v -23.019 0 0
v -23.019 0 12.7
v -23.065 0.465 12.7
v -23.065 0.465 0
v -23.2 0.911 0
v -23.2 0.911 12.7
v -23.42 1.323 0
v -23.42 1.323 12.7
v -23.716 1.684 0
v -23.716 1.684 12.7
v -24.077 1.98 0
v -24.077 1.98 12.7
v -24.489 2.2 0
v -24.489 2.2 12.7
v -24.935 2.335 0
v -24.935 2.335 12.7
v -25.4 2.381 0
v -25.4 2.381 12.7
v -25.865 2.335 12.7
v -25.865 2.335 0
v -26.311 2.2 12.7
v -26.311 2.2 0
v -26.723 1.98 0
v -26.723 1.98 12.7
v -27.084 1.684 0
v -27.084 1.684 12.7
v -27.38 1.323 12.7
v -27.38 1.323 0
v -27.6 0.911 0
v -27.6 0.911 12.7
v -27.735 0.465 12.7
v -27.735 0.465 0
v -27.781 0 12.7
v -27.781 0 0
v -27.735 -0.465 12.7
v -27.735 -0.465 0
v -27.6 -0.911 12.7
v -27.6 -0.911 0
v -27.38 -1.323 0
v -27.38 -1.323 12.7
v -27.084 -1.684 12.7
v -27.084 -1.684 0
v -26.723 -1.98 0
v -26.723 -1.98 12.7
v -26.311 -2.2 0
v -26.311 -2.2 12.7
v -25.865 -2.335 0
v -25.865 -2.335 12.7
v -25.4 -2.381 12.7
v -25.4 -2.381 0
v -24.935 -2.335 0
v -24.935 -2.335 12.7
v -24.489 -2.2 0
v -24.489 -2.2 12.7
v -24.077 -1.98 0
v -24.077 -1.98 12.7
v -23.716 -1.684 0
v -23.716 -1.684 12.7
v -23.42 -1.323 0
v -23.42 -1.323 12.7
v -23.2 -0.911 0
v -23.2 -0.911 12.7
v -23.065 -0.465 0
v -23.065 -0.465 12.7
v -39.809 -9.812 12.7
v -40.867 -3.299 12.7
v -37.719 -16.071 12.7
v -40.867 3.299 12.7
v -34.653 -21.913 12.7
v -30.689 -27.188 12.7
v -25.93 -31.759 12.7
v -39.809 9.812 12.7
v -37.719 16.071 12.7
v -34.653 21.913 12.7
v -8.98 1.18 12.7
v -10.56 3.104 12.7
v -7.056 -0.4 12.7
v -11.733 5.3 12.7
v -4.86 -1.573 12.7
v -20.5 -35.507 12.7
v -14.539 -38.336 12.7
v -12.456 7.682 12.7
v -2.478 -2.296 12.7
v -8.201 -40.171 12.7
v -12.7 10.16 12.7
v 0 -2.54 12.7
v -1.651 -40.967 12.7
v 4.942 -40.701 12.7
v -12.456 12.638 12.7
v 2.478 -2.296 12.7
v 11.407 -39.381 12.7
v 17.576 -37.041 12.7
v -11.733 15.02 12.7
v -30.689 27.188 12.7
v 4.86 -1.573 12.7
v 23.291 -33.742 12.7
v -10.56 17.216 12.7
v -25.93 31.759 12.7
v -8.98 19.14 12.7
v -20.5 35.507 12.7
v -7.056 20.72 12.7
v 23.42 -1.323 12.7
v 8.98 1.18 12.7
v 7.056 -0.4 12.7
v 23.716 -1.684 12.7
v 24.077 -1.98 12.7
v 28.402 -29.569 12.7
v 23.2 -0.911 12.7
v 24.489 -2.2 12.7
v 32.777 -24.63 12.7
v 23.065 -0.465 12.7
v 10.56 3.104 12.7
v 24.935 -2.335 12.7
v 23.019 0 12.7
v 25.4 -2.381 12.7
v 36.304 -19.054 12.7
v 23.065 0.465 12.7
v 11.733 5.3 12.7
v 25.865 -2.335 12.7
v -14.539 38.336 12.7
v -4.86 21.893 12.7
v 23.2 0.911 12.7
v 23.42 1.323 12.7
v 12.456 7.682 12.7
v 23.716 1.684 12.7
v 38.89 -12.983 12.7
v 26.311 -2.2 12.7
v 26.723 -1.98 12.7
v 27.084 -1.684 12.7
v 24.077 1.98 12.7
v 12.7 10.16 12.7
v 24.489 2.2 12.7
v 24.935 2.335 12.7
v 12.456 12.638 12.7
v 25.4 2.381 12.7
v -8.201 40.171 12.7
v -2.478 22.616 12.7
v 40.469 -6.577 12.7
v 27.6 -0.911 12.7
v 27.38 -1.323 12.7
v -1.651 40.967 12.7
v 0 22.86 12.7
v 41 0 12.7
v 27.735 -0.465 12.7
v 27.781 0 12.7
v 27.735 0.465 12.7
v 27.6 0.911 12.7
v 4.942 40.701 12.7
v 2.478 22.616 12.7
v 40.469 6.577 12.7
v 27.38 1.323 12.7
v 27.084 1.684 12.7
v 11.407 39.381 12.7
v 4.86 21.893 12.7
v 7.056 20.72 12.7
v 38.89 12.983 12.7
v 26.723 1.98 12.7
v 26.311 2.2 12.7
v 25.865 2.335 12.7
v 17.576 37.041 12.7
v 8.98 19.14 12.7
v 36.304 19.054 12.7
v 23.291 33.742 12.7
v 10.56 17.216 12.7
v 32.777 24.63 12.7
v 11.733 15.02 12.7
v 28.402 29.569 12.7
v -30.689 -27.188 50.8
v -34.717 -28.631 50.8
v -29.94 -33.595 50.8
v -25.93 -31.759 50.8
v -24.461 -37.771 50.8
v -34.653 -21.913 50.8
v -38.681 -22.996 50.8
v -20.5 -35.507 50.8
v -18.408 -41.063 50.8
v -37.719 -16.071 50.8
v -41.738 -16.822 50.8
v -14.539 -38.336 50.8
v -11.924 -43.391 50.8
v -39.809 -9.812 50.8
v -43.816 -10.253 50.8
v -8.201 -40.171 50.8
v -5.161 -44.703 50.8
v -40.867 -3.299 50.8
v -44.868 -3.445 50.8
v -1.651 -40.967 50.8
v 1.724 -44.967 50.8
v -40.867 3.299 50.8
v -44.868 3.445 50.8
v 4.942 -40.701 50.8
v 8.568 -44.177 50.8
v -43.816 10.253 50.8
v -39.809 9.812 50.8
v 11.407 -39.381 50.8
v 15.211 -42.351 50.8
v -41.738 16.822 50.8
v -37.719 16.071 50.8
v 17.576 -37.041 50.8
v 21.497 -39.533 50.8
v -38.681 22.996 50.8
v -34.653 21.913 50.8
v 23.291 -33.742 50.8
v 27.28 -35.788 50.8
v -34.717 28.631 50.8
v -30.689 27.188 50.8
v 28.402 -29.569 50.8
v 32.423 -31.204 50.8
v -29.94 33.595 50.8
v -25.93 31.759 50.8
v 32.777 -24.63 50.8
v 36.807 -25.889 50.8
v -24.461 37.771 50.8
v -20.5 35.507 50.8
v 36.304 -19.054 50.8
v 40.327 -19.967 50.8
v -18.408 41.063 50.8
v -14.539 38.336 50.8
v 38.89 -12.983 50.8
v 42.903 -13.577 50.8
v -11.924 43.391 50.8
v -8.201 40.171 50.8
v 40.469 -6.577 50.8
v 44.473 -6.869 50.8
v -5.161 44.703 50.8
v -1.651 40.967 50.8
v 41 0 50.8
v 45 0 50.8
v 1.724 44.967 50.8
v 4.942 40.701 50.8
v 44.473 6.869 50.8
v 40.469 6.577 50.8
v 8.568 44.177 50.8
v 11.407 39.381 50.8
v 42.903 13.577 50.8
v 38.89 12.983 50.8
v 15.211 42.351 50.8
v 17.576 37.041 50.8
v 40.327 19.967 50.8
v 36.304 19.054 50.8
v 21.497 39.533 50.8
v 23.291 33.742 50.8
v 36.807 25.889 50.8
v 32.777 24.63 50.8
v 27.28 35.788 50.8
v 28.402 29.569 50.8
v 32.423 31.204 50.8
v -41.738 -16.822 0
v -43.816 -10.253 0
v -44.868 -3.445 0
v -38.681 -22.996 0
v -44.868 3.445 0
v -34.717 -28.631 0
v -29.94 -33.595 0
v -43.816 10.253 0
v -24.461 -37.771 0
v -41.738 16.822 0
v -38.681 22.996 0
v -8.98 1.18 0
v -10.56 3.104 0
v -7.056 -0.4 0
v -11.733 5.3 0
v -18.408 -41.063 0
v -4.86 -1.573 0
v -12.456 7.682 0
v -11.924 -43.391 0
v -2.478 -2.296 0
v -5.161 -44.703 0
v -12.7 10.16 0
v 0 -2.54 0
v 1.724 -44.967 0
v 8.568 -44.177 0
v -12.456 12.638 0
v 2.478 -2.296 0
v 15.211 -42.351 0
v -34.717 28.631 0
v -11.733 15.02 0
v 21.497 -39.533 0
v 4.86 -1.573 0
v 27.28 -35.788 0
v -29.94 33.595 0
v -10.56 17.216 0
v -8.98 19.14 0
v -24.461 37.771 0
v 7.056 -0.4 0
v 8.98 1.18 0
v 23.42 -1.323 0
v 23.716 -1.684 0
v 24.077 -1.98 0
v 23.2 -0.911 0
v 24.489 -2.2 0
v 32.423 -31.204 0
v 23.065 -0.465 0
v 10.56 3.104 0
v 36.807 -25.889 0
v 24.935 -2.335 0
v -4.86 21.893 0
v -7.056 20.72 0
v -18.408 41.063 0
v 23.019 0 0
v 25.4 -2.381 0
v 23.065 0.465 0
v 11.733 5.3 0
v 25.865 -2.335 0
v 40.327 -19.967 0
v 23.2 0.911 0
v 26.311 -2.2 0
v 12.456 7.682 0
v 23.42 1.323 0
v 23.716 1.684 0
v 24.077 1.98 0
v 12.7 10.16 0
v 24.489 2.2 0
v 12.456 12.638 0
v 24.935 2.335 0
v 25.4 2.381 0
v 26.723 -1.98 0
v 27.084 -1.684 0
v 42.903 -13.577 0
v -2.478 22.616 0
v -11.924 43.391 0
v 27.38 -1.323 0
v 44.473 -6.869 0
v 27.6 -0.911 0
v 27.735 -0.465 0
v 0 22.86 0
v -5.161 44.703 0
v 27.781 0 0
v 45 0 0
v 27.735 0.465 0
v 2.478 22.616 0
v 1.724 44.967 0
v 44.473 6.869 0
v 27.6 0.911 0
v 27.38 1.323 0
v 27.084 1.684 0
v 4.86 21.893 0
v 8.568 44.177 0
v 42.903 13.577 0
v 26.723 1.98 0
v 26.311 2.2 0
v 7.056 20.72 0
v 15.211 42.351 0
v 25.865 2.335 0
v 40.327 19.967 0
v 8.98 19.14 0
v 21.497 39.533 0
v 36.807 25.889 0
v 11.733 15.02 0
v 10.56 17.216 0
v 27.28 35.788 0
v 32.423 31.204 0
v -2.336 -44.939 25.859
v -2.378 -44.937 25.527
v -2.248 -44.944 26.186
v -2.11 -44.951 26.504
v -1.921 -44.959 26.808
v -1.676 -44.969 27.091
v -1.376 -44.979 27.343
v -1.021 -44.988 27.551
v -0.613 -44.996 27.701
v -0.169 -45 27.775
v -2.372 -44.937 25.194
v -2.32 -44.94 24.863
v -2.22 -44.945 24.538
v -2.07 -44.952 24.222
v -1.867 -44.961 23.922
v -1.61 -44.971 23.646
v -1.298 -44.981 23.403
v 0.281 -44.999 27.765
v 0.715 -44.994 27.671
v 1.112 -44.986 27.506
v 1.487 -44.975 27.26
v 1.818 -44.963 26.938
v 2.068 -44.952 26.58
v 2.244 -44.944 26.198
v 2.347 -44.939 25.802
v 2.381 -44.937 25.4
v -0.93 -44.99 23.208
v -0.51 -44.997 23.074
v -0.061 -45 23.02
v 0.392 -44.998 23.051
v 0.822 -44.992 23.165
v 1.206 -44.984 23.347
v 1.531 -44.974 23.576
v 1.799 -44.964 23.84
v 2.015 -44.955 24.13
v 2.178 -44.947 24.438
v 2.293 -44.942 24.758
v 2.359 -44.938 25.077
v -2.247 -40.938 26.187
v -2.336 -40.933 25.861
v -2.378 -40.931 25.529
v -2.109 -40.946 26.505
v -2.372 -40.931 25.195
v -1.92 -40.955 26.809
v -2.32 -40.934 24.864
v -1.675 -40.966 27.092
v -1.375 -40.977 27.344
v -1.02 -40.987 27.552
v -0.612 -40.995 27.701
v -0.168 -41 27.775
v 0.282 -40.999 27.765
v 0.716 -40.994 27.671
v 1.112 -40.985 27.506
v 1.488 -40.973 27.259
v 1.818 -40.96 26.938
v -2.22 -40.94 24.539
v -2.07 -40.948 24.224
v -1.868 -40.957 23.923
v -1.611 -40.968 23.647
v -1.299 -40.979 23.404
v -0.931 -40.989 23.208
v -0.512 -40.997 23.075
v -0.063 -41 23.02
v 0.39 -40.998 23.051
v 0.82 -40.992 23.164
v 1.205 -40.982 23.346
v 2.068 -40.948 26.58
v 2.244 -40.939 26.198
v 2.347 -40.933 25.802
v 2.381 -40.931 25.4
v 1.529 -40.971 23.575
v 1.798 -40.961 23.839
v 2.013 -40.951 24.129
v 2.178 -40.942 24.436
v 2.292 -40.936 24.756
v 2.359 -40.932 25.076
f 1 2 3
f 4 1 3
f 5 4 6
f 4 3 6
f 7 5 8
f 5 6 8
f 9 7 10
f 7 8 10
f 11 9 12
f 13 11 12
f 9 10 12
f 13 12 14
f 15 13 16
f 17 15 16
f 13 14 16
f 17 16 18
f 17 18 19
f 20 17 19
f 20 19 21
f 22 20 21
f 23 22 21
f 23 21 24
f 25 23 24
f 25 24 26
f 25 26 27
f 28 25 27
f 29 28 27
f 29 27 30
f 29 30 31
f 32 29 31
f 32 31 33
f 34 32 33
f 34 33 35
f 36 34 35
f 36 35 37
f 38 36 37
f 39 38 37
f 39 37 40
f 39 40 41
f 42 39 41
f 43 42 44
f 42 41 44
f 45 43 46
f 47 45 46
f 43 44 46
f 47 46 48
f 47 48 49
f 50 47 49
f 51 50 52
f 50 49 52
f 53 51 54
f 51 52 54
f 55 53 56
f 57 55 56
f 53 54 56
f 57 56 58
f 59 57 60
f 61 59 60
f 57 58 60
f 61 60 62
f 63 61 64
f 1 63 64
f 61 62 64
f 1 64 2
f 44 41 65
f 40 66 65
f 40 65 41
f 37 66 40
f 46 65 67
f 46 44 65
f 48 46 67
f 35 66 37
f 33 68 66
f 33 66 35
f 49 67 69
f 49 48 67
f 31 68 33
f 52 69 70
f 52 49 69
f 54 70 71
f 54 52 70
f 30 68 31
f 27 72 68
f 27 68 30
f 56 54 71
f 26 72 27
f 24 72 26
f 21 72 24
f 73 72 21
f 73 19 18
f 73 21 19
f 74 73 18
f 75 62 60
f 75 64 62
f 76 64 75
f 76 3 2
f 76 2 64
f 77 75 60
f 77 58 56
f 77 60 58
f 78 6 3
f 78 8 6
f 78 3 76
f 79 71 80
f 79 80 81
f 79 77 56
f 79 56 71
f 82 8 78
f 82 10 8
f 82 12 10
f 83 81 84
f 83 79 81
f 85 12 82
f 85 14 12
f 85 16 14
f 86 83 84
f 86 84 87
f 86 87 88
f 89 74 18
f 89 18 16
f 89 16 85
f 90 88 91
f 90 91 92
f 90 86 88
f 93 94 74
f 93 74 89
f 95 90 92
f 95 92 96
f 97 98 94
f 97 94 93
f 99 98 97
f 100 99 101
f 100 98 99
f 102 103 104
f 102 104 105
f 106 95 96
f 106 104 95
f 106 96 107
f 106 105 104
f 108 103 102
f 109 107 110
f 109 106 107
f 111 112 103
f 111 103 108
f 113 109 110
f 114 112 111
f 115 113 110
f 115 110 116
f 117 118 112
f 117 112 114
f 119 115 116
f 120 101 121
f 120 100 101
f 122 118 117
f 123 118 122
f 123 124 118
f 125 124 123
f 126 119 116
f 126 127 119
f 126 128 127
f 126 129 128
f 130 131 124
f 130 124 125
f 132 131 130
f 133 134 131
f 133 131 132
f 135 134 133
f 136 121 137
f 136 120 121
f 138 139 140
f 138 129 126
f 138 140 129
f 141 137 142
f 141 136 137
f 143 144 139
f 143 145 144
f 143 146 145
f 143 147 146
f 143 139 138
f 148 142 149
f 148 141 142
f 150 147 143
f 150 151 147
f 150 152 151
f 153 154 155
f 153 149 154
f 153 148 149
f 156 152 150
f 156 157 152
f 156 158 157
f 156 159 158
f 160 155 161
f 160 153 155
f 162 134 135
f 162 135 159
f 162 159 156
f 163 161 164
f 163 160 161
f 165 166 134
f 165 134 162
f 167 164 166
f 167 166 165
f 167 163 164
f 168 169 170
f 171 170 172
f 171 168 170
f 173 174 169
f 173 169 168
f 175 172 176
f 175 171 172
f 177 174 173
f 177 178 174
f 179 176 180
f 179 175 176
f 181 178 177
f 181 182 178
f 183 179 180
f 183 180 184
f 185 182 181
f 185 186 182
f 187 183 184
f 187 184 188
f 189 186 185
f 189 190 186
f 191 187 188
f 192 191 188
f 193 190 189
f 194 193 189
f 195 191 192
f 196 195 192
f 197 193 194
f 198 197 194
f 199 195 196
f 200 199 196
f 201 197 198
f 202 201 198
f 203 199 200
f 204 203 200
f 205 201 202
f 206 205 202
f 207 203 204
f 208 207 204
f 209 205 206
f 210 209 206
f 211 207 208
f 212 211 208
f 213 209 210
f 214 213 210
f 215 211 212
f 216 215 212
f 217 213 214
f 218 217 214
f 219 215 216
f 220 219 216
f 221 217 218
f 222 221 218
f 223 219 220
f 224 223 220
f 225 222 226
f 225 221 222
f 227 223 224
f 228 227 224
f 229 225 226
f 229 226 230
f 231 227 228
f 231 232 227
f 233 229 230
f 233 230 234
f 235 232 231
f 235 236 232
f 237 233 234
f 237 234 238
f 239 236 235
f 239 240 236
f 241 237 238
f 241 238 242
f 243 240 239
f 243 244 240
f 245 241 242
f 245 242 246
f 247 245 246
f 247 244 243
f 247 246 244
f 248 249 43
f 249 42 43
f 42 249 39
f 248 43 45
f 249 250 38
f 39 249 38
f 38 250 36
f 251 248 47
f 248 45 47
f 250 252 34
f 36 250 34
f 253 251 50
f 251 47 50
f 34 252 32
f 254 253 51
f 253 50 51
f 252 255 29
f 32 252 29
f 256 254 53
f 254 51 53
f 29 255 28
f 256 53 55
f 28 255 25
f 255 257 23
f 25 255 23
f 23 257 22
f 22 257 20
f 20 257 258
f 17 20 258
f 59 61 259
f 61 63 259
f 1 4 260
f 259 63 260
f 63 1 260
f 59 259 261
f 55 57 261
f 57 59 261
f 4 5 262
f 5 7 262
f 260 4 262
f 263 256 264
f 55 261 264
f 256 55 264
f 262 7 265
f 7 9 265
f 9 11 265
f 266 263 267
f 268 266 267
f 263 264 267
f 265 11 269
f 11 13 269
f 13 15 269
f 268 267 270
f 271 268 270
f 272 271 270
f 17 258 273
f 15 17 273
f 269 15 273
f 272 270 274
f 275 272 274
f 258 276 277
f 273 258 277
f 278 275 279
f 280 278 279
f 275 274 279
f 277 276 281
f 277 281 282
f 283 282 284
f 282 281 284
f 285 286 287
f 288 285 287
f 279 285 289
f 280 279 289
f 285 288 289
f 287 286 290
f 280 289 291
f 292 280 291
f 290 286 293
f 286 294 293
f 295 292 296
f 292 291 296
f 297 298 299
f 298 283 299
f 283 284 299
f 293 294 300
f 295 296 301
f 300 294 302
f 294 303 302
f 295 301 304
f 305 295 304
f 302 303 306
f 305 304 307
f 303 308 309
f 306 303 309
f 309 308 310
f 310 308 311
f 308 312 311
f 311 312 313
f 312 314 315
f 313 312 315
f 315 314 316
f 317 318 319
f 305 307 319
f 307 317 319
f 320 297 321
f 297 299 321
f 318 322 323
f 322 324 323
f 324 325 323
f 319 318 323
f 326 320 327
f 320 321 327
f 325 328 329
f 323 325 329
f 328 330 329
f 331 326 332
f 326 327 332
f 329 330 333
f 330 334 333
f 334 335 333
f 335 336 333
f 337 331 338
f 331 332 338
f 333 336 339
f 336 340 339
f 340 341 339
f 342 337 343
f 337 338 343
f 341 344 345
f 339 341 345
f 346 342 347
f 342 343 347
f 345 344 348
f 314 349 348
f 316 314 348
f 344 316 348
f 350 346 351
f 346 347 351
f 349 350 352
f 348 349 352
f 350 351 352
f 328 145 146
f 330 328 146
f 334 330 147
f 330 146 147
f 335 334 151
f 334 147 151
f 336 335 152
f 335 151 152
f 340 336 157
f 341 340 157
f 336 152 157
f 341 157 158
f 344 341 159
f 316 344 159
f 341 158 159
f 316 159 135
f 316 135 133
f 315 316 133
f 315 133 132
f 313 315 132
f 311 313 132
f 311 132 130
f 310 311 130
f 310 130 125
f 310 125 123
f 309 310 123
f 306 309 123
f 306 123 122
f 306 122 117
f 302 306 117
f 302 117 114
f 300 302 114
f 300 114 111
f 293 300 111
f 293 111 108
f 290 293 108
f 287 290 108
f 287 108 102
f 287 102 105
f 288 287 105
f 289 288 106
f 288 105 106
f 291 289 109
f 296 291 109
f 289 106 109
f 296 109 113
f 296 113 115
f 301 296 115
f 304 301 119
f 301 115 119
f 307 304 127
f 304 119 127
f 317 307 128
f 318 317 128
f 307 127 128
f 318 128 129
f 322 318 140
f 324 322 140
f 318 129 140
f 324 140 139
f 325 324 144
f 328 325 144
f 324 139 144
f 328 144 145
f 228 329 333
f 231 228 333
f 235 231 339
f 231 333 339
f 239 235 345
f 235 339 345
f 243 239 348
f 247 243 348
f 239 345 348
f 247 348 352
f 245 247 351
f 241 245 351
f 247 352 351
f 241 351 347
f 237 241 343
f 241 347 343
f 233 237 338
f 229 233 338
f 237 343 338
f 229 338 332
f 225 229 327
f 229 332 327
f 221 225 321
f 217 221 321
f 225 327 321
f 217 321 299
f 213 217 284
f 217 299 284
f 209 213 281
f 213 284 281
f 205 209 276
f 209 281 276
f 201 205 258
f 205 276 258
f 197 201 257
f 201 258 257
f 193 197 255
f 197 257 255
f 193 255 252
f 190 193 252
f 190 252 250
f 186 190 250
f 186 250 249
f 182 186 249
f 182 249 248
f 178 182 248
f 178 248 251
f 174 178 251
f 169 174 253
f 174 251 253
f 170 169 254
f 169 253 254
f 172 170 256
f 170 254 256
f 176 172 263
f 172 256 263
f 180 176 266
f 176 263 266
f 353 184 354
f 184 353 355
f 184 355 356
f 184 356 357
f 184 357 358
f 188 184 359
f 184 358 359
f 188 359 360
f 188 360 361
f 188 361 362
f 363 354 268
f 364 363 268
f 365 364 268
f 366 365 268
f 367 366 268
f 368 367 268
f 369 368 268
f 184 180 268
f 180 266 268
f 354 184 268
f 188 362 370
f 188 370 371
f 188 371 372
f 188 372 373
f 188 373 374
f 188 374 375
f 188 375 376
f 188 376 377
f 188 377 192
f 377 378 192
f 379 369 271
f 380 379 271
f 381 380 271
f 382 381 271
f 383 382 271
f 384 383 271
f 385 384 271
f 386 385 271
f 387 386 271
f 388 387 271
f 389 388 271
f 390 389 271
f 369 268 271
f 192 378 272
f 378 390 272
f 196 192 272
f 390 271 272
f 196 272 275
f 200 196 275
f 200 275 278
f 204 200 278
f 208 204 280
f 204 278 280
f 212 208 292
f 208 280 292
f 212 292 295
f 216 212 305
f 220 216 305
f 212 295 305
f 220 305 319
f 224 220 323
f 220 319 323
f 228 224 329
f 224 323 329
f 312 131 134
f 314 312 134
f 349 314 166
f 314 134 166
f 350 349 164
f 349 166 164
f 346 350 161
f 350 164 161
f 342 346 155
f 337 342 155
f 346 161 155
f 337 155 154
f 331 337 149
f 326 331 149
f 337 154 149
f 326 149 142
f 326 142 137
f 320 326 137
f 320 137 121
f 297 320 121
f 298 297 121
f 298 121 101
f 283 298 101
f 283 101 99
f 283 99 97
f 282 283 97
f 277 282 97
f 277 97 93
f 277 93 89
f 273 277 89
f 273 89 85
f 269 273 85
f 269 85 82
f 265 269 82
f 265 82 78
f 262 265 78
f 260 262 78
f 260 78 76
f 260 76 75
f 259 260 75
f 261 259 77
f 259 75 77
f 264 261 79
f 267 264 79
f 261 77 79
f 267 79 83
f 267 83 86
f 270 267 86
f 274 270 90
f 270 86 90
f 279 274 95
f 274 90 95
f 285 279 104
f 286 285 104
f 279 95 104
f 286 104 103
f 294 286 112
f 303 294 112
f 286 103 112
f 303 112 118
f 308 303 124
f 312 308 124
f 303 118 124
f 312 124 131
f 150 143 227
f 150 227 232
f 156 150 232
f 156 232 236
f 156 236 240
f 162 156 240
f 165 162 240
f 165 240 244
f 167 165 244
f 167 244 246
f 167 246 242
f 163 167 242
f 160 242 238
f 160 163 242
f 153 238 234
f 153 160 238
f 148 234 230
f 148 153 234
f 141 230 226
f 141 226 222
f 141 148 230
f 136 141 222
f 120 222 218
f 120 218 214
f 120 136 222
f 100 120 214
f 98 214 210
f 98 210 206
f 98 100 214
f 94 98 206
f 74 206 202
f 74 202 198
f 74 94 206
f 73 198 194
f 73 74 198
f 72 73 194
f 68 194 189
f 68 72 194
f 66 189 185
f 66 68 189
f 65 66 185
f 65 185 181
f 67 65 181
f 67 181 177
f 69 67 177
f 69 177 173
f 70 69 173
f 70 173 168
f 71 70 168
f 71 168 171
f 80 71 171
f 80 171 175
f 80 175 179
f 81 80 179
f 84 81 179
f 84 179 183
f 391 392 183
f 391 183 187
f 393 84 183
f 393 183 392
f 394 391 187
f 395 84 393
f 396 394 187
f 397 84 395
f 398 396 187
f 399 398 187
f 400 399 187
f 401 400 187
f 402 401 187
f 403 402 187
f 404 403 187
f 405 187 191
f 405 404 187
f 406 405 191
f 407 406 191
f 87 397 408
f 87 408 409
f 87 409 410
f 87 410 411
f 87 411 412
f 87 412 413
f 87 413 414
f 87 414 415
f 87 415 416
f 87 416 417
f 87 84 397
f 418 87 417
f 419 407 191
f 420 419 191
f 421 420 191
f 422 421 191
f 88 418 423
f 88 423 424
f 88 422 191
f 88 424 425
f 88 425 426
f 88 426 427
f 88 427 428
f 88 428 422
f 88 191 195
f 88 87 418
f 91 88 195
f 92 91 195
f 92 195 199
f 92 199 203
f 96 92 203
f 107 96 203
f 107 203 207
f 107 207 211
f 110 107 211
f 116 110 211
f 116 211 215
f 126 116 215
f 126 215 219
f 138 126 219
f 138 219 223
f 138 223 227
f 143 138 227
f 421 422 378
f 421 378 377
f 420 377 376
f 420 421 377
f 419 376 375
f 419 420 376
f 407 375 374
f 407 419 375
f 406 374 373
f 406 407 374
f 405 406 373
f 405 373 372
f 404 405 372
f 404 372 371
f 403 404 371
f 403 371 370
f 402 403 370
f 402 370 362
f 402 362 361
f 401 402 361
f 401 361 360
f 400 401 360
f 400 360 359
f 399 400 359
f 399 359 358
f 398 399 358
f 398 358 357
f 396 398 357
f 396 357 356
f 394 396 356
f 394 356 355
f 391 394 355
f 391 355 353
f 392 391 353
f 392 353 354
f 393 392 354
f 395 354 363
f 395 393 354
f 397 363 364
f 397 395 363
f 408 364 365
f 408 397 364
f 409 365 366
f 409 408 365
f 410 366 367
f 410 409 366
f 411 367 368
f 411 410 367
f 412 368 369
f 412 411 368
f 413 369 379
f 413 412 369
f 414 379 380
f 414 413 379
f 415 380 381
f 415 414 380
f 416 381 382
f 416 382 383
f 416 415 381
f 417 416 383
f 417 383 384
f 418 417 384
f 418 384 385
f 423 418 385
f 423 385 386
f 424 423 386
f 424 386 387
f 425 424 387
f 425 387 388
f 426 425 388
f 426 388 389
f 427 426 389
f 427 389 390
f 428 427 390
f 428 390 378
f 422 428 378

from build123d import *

# Parameters (mm, degrees)
F0_R     = 45
F1_DEPTH = 12.7
F2_R     = 45
F2_R_2   = 41
F3_DEPTH = 38.1
F4_R     = 2.38125
F5_DEPTH = 79.502
F6_R     = 2.38125
F7_DEPTH = 25.4
F8_R     = 12.7
F9_DEPTH = 25.4


with BuildPart() as f1:
    # F0 (on Top) → F1 (new body)
    with BuildSketch(Plane.XY):
        Circle(F0_R)
    extrude(amount=F1_DEPTH)

    # F2 (on face) → F3 (join)
    with BuildSketch(Plane.XY.offset(12.7)):
        Circle(F2_R)
        Circle(F2_R_2, mode=Mode.SUBTRACT)
    extrude(amount=F3_DEPTH)

    # F4 (on Front) → F5 (cut)
    with BuildSketch(Plane.XZ):
        with Locations((0, 25.4)):
            Circle(F4_R)
    extrude(amount=F5_DEPTH, mode=Mode.SUBTRACT)

    # F6 (on face) → F7 (cut)
    with BuildSketch(Plane.XY.offset(12.7)):
        with Locations((-25.4, 0)):
            Circle(F6_R)
        with Locations((25.4, 0)):
            Circle(F6_R)
    extrude(amount=-F7_DEPTH, mode=Mode.SUBTRACT)

    # F8 (on face) → F9 (cut)
    with BuildSketch(Plane.XY.offset(12.7)):
        with Locations((0, 10.16)):
            Circle(F8_R)
    extrude(amount=-F9_DEPTH, mode=Mode.SUBTRACT)


solid = f1.part
